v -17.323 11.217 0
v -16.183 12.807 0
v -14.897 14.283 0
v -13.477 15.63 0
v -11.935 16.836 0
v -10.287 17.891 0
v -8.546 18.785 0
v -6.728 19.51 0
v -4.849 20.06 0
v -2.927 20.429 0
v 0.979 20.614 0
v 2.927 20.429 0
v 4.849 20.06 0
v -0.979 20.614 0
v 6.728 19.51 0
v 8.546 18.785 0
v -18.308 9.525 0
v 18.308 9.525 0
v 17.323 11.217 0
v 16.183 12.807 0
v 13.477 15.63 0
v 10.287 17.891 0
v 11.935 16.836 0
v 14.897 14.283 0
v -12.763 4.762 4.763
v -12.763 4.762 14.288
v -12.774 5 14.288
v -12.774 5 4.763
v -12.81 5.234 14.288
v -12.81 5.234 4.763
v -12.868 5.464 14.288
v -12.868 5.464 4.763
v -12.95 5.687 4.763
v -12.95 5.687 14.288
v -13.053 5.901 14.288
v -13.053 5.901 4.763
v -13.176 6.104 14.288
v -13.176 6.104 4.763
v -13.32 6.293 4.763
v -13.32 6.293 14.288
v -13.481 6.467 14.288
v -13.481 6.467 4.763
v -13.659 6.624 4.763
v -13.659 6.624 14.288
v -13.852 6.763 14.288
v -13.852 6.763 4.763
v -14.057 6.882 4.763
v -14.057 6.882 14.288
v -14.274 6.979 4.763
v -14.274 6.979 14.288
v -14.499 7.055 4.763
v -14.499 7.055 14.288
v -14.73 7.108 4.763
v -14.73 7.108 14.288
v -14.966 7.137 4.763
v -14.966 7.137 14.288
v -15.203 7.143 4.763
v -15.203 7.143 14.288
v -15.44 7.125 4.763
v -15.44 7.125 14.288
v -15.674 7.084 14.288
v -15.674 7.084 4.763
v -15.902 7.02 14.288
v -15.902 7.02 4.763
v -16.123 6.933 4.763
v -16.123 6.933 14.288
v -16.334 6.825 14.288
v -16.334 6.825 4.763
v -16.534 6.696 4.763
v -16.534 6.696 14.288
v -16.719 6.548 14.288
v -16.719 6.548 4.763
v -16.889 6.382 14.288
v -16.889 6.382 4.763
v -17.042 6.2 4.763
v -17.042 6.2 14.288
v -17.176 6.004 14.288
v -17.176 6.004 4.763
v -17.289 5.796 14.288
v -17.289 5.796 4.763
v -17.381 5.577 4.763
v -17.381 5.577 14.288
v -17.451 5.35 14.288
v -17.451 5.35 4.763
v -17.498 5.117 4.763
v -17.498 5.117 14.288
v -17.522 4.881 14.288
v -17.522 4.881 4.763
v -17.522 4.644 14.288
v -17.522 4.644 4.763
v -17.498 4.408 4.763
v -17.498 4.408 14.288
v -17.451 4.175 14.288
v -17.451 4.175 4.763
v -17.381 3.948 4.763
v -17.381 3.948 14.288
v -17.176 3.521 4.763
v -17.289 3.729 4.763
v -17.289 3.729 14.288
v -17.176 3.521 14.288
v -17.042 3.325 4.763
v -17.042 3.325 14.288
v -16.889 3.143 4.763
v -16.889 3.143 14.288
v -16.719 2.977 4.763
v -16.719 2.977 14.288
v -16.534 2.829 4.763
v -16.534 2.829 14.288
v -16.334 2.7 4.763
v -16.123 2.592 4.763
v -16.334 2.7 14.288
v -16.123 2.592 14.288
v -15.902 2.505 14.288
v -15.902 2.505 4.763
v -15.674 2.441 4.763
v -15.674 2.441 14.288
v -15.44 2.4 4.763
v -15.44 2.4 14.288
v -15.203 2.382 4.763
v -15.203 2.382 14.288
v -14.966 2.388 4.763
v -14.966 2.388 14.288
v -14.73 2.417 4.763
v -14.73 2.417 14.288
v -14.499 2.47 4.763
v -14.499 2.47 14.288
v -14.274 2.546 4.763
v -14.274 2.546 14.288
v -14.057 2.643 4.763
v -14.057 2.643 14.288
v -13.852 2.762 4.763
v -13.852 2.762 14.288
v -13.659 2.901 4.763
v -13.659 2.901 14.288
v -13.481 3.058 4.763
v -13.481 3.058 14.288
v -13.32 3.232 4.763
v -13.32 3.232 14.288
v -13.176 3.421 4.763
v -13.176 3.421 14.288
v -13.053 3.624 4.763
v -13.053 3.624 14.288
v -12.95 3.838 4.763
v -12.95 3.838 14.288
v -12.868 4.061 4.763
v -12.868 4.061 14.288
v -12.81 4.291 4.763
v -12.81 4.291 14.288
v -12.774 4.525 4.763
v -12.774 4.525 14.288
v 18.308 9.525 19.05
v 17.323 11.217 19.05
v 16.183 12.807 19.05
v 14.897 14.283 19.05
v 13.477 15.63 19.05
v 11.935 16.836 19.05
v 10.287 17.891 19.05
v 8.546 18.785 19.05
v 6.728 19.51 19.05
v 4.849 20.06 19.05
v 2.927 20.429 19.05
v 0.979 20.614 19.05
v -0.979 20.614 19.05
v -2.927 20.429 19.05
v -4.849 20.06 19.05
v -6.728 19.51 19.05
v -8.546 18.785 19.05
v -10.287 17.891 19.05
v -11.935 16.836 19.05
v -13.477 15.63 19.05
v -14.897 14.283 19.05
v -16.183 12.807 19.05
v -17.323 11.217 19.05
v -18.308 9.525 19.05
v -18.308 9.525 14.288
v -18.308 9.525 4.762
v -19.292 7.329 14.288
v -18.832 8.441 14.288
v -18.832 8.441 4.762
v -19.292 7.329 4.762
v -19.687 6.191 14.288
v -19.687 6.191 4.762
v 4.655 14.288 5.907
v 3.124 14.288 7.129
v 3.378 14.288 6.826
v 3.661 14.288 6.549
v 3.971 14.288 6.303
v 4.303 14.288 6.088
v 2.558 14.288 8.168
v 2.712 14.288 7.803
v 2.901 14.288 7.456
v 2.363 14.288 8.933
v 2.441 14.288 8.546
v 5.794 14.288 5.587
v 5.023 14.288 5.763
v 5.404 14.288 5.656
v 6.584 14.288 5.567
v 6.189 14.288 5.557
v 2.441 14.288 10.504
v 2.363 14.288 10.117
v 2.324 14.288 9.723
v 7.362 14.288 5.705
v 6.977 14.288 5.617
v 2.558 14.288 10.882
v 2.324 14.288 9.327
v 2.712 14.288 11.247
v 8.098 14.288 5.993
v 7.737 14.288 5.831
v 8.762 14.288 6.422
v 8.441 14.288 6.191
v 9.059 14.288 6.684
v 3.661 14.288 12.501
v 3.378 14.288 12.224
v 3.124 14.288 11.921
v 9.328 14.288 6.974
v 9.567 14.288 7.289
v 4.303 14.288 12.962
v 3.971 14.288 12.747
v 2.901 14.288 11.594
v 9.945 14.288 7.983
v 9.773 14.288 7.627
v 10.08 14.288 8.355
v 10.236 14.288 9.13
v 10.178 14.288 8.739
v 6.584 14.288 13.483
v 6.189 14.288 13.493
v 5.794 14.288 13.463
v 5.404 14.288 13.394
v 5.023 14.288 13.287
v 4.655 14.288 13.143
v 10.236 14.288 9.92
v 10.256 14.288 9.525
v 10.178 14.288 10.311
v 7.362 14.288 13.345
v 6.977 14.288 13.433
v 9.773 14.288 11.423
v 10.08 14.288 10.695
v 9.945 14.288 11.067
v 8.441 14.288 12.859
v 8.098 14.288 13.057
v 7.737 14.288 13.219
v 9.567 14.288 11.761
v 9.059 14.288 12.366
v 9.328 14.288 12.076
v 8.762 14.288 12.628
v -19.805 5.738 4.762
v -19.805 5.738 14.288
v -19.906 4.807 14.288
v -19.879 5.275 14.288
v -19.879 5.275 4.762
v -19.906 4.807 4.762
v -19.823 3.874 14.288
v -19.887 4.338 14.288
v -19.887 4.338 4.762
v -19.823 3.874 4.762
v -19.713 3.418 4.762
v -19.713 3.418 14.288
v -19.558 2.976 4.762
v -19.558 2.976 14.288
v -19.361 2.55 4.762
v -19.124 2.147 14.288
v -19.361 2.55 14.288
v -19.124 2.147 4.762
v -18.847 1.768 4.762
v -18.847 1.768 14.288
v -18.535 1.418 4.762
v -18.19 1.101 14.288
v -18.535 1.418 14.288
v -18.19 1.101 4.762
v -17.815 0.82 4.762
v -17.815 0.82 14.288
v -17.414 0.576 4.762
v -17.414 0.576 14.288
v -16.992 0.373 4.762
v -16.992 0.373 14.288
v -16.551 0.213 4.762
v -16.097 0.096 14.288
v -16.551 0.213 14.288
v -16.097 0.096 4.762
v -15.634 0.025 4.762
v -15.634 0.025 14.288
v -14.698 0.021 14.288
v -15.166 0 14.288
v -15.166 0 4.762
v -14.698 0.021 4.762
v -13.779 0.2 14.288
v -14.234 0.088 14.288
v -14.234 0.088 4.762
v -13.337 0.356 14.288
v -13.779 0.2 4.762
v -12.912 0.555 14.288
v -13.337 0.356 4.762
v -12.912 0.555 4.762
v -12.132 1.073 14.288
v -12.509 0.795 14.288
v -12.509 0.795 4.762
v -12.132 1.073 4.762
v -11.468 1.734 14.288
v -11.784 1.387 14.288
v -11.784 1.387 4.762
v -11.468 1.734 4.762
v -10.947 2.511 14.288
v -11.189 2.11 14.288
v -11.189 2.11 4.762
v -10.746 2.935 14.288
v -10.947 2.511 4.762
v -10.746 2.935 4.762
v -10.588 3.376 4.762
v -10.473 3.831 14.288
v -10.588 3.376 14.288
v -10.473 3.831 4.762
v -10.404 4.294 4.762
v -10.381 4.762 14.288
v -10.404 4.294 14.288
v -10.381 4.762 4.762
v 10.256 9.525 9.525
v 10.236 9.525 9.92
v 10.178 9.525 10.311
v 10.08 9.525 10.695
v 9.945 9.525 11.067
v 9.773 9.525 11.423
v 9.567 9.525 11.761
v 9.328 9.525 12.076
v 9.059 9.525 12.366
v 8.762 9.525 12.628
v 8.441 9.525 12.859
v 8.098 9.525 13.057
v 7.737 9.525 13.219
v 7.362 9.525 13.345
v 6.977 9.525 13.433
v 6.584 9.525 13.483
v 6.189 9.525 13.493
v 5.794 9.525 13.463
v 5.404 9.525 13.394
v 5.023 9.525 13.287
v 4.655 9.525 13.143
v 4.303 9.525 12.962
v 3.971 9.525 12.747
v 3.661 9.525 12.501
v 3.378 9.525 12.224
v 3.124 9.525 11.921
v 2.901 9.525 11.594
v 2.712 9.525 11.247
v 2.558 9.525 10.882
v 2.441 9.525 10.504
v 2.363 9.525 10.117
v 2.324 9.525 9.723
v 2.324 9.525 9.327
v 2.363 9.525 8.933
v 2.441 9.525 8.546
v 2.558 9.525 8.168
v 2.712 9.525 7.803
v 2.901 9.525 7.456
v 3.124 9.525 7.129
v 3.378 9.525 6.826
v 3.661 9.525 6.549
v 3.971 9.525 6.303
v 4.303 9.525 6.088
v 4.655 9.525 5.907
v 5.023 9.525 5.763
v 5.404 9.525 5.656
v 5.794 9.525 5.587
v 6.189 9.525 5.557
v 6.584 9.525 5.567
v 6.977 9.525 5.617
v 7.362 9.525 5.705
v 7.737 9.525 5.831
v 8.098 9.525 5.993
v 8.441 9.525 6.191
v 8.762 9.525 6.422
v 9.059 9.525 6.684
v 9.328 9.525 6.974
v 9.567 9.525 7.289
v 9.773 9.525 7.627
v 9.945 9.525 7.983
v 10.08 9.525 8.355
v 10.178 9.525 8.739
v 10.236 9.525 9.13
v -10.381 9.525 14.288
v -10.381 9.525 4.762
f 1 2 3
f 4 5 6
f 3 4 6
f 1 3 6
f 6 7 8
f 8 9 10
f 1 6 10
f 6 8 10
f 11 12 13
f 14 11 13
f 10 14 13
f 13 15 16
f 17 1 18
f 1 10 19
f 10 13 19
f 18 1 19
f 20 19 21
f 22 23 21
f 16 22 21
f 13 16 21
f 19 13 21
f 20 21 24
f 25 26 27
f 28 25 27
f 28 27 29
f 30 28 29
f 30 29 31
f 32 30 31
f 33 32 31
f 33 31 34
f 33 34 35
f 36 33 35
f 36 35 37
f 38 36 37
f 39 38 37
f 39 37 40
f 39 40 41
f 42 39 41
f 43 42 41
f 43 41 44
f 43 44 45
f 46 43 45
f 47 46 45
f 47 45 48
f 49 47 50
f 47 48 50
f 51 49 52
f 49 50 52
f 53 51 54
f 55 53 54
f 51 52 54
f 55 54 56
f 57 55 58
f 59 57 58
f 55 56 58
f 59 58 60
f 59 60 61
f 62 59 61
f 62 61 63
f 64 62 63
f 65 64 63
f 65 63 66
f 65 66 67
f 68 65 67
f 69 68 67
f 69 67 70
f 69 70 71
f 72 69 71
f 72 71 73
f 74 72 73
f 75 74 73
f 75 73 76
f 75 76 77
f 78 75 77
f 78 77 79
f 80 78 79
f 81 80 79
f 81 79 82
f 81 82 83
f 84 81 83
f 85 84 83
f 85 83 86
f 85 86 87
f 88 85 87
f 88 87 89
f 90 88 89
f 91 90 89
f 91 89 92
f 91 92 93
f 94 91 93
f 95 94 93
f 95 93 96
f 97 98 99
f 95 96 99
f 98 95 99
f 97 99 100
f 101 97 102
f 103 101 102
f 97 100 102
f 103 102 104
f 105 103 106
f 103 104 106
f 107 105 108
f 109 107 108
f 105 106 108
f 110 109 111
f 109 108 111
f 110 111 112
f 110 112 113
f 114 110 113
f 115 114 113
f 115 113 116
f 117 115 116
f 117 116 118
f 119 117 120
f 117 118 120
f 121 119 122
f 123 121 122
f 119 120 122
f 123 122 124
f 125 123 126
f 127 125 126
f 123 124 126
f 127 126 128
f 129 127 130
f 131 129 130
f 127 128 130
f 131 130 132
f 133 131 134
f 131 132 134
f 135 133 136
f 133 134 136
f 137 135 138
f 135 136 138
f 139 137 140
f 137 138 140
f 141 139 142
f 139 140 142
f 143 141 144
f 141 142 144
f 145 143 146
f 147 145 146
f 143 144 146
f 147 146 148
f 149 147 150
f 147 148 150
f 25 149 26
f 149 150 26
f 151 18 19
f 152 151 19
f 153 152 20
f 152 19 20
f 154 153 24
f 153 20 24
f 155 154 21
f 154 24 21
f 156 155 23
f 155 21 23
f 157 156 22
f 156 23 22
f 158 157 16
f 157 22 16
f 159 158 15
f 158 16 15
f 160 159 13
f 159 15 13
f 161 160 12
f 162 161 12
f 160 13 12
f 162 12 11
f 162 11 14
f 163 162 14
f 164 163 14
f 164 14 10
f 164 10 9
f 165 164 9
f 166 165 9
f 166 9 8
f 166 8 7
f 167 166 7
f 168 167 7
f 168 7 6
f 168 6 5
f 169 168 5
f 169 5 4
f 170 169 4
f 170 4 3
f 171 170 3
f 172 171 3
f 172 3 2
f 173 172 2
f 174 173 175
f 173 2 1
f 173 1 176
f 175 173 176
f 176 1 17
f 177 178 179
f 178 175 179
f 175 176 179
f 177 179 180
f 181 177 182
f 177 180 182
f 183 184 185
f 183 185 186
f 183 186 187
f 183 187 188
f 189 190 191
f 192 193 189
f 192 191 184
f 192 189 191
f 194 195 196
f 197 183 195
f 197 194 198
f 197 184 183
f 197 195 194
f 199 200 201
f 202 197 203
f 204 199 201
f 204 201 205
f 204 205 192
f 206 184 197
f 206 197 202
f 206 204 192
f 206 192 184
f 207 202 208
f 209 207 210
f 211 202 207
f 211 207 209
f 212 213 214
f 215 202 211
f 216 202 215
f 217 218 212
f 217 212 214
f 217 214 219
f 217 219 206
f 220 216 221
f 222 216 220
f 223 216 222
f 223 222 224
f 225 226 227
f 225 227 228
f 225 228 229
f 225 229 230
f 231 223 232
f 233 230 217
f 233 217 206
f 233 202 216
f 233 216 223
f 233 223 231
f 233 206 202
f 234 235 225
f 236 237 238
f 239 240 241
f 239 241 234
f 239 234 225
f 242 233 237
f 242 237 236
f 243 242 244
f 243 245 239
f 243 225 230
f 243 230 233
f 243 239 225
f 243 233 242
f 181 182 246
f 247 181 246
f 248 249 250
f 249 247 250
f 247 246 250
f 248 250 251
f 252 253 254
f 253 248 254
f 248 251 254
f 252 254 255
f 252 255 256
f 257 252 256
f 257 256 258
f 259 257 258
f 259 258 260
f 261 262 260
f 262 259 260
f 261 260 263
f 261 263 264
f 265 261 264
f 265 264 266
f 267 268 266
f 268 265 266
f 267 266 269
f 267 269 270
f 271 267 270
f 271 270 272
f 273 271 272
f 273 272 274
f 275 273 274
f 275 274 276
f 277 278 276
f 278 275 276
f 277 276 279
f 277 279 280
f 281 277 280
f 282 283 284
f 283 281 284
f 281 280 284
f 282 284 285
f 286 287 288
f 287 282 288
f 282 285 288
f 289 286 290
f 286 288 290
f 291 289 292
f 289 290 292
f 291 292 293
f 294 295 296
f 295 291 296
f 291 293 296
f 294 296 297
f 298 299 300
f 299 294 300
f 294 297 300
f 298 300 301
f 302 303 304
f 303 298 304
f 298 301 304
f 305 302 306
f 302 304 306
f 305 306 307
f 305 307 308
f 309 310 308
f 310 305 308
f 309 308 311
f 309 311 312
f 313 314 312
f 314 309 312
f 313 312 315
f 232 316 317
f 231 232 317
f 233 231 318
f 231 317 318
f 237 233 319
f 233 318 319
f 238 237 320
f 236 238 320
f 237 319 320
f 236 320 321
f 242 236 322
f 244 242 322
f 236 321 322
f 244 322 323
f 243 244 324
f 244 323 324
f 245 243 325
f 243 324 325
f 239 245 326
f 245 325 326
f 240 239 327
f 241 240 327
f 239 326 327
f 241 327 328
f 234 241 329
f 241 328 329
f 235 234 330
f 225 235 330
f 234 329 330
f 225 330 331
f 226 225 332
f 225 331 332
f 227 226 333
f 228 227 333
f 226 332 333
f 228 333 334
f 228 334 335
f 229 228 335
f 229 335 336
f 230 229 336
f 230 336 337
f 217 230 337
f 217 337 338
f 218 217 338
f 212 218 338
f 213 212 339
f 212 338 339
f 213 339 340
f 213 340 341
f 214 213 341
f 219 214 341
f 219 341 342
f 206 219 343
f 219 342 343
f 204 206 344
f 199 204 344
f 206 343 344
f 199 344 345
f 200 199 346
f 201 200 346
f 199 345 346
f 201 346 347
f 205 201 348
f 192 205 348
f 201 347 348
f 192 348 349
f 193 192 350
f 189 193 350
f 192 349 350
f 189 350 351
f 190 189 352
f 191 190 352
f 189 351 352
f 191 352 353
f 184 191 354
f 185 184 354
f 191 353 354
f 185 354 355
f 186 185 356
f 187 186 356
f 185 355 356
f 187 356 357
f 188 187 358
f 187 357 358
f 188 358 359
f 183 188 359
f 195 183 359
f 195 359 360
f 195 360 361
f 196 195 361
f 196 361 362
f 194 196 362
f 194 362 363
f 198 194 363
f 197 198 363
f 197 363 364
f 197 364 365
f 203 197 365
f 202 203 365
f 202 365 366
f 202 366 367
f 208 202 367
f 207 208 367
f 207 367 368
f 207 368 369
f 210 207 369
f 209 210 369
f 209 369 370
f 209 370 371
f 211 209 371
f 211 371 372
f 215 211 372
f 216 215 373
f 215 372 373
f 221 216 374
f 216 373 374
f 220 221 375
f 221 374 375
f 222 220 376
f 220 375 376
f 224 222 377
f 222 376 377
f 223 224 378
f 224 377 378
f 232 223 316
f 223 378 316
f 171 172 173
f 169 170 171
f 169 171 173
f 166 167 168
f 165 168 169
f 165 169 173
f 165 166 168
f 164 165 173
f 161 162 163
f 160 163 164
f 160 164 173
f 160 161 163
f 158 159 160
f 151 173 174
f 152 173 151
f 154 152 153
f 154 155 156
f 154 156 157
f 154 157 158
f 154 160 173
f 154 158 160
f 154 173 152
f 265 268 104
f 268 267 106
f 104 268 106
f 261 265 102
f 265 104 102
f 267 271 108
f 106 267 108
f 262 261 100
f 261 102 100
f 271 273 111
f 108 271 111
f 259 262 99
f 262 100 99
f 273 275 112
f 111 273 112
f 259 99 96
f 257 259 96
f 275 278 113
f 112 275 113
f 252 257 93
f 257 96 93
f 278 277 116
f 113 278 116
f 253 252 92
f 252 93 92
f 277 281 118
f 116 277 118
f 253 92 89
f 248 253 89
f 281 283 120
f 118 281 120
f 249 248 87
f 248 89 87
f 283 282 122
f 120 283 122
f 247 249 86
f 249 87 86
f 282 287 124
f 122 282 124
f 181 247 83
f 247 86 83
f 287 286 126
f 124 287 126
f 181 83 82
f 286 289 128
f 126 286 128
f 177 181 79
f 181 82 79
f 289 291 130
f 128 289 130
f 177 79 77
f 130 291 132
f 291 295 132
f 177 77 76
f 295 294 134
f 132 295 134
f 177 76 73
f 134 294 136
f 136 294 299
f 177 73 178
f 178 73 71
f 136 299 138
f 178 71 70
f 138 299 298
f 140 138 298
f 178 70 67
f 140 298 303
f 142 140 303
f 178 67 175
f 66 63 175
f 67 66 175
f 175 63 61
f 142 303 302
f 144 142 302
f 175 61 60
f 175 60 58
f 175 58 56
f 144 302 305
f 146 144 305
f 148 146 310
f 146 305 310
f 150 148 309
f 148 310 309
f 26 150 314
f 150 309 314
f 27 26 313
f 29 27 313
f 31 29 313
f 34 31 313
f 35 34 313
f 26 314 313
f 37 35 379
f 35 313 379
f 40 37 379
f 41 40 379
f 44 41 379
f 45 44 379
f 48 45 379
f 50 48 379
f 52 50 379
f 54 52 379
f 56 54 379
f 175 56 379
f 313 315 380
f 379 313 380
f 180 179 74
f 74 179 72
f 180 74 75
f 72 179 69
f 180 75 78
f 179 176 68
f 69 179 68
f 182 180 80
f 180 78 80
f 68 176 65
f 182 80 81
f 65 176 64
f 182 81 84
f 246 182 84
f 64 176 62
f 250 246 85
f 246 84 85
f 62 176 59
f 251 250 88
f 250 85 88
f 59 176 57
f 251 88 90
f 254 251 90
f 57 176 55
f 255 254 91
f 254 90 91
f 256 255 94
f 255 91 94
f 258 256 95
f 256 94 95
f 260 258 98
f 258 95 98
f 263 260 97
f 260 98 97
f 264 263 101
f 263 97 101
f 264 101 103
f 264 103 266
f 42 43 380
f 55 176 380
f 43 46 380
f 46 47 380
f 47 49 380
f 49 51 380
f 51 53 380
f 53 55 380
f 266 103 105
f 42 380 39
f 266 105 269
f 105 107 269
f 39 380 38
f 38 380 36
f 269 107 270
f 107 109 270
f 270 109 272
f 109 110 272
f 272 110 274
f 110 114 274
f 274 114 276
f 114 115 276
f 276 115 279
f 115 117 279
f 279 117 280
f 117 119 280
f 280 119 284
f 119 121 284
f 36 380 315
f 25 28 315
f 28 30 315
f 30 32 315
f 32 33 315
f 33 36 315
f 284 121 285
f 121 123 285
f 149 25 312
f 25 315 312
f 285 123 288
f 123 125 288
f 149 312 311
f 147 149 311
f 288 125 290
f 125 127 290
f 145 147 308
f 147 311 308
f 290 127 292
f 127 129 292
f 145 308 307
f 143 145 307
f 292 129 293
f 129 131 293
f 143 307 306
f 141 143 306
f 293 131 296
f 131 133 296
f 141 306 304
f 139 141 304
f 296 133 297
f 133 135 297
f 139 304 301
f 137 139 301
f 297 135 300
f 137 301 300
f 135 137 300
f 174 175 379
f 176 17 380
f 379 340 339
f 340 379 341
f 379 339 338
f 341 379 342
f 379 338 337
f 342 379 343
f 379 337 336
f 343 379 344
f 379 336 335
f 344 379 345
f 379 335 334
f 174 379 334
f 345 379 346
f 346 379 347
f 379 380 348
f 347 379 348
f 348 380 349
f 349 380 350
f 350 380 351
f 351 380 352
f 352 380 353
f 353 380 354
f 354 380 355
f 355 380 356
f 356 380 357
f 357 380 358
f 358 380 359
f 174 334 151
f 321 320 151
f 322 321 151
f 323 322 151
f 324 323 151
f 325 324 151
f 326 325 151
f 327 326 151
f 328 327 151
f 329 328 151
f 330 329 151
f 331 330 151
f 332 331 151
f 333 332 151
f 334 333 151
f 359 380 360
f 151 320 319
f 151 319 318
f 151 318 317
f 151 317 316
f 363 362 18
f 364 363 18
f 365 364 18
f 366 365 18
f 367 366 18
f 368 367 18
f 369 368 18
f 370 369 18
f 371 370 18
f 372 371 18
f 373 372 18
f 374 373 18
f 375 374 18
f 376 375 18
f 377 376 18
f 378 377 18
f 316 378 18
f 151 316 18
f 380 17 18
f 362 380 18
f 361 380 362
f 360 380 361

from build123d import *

# Parameters (mm, degrees)
F1_DEPTH = 19.05
F2_W     = 4.7625
F2_H     = 4.7625
F3_DEPTH = 25.4
F4_R     = 2.38125
F5_DEPTH = 14.2885
F6_R     = 3.96875
F7_DEPTH = 4.7625


with BuildPart() as f1:
    # F0 (on Top) → F1 (new body)
    with BuildSketch(Plane.XY):
        with BuildLine():
            Line((-10.381285, 9.525), (18.307943, 9.525))
            ThreePointArc((18.307943, 9.525), (-1.803848, 20.558515), (-19.68692, 6.19125))
            ThreePointArc((-19.68692, 6.19125), (-15.866531, 0.055161), (-10.381285, 4.7625))
            Line((-10.381285, 4.7625), (-10.381285, 9.525))
        make_face()
    extrude(amount=F1_DEPTH)

    # F2 (on face) → F3 (cut)
    with BuildSketch(Plane.YZ.offset(-10.381285)):
        with Locations((7.14375, 16.66875)):
            Rectangle(F2_W, F2_H)
        with Locations((2.38125, 16.66875)):
            Rectangle(F2_W, F2_H)
        with Locations((7.14375, 2.38125)):
            Rectangle(F2_W, F2_H)
        with Locations((2.38125, 2.38125)):
            Rectangle(F2_W, F2_H)
    extrude(amount=-F3_DEPTH, mode=Mode.SUBTRACT)

    # F4 (on face) → F5 (cut, through all)
    with BuildSketch(Plane.XY.offset(14.2875)):
        with Locations((-15.143785, 4.7625)):
            Circle(F4_R)
    extrude(amount=-F5_DEPTH, mode=Mode.SUBTRACT)

    # F6 (on face) → F7 (cut)
    with BuildSketch(Plane.XZ.offset(-9.525)):
        with Locations((6.287465, 9.525)):
            Circle(F6_R)
    extrude(amount=-F7_DEPTH, mode=Mode.SUBTRACT)


solid = f1.part
